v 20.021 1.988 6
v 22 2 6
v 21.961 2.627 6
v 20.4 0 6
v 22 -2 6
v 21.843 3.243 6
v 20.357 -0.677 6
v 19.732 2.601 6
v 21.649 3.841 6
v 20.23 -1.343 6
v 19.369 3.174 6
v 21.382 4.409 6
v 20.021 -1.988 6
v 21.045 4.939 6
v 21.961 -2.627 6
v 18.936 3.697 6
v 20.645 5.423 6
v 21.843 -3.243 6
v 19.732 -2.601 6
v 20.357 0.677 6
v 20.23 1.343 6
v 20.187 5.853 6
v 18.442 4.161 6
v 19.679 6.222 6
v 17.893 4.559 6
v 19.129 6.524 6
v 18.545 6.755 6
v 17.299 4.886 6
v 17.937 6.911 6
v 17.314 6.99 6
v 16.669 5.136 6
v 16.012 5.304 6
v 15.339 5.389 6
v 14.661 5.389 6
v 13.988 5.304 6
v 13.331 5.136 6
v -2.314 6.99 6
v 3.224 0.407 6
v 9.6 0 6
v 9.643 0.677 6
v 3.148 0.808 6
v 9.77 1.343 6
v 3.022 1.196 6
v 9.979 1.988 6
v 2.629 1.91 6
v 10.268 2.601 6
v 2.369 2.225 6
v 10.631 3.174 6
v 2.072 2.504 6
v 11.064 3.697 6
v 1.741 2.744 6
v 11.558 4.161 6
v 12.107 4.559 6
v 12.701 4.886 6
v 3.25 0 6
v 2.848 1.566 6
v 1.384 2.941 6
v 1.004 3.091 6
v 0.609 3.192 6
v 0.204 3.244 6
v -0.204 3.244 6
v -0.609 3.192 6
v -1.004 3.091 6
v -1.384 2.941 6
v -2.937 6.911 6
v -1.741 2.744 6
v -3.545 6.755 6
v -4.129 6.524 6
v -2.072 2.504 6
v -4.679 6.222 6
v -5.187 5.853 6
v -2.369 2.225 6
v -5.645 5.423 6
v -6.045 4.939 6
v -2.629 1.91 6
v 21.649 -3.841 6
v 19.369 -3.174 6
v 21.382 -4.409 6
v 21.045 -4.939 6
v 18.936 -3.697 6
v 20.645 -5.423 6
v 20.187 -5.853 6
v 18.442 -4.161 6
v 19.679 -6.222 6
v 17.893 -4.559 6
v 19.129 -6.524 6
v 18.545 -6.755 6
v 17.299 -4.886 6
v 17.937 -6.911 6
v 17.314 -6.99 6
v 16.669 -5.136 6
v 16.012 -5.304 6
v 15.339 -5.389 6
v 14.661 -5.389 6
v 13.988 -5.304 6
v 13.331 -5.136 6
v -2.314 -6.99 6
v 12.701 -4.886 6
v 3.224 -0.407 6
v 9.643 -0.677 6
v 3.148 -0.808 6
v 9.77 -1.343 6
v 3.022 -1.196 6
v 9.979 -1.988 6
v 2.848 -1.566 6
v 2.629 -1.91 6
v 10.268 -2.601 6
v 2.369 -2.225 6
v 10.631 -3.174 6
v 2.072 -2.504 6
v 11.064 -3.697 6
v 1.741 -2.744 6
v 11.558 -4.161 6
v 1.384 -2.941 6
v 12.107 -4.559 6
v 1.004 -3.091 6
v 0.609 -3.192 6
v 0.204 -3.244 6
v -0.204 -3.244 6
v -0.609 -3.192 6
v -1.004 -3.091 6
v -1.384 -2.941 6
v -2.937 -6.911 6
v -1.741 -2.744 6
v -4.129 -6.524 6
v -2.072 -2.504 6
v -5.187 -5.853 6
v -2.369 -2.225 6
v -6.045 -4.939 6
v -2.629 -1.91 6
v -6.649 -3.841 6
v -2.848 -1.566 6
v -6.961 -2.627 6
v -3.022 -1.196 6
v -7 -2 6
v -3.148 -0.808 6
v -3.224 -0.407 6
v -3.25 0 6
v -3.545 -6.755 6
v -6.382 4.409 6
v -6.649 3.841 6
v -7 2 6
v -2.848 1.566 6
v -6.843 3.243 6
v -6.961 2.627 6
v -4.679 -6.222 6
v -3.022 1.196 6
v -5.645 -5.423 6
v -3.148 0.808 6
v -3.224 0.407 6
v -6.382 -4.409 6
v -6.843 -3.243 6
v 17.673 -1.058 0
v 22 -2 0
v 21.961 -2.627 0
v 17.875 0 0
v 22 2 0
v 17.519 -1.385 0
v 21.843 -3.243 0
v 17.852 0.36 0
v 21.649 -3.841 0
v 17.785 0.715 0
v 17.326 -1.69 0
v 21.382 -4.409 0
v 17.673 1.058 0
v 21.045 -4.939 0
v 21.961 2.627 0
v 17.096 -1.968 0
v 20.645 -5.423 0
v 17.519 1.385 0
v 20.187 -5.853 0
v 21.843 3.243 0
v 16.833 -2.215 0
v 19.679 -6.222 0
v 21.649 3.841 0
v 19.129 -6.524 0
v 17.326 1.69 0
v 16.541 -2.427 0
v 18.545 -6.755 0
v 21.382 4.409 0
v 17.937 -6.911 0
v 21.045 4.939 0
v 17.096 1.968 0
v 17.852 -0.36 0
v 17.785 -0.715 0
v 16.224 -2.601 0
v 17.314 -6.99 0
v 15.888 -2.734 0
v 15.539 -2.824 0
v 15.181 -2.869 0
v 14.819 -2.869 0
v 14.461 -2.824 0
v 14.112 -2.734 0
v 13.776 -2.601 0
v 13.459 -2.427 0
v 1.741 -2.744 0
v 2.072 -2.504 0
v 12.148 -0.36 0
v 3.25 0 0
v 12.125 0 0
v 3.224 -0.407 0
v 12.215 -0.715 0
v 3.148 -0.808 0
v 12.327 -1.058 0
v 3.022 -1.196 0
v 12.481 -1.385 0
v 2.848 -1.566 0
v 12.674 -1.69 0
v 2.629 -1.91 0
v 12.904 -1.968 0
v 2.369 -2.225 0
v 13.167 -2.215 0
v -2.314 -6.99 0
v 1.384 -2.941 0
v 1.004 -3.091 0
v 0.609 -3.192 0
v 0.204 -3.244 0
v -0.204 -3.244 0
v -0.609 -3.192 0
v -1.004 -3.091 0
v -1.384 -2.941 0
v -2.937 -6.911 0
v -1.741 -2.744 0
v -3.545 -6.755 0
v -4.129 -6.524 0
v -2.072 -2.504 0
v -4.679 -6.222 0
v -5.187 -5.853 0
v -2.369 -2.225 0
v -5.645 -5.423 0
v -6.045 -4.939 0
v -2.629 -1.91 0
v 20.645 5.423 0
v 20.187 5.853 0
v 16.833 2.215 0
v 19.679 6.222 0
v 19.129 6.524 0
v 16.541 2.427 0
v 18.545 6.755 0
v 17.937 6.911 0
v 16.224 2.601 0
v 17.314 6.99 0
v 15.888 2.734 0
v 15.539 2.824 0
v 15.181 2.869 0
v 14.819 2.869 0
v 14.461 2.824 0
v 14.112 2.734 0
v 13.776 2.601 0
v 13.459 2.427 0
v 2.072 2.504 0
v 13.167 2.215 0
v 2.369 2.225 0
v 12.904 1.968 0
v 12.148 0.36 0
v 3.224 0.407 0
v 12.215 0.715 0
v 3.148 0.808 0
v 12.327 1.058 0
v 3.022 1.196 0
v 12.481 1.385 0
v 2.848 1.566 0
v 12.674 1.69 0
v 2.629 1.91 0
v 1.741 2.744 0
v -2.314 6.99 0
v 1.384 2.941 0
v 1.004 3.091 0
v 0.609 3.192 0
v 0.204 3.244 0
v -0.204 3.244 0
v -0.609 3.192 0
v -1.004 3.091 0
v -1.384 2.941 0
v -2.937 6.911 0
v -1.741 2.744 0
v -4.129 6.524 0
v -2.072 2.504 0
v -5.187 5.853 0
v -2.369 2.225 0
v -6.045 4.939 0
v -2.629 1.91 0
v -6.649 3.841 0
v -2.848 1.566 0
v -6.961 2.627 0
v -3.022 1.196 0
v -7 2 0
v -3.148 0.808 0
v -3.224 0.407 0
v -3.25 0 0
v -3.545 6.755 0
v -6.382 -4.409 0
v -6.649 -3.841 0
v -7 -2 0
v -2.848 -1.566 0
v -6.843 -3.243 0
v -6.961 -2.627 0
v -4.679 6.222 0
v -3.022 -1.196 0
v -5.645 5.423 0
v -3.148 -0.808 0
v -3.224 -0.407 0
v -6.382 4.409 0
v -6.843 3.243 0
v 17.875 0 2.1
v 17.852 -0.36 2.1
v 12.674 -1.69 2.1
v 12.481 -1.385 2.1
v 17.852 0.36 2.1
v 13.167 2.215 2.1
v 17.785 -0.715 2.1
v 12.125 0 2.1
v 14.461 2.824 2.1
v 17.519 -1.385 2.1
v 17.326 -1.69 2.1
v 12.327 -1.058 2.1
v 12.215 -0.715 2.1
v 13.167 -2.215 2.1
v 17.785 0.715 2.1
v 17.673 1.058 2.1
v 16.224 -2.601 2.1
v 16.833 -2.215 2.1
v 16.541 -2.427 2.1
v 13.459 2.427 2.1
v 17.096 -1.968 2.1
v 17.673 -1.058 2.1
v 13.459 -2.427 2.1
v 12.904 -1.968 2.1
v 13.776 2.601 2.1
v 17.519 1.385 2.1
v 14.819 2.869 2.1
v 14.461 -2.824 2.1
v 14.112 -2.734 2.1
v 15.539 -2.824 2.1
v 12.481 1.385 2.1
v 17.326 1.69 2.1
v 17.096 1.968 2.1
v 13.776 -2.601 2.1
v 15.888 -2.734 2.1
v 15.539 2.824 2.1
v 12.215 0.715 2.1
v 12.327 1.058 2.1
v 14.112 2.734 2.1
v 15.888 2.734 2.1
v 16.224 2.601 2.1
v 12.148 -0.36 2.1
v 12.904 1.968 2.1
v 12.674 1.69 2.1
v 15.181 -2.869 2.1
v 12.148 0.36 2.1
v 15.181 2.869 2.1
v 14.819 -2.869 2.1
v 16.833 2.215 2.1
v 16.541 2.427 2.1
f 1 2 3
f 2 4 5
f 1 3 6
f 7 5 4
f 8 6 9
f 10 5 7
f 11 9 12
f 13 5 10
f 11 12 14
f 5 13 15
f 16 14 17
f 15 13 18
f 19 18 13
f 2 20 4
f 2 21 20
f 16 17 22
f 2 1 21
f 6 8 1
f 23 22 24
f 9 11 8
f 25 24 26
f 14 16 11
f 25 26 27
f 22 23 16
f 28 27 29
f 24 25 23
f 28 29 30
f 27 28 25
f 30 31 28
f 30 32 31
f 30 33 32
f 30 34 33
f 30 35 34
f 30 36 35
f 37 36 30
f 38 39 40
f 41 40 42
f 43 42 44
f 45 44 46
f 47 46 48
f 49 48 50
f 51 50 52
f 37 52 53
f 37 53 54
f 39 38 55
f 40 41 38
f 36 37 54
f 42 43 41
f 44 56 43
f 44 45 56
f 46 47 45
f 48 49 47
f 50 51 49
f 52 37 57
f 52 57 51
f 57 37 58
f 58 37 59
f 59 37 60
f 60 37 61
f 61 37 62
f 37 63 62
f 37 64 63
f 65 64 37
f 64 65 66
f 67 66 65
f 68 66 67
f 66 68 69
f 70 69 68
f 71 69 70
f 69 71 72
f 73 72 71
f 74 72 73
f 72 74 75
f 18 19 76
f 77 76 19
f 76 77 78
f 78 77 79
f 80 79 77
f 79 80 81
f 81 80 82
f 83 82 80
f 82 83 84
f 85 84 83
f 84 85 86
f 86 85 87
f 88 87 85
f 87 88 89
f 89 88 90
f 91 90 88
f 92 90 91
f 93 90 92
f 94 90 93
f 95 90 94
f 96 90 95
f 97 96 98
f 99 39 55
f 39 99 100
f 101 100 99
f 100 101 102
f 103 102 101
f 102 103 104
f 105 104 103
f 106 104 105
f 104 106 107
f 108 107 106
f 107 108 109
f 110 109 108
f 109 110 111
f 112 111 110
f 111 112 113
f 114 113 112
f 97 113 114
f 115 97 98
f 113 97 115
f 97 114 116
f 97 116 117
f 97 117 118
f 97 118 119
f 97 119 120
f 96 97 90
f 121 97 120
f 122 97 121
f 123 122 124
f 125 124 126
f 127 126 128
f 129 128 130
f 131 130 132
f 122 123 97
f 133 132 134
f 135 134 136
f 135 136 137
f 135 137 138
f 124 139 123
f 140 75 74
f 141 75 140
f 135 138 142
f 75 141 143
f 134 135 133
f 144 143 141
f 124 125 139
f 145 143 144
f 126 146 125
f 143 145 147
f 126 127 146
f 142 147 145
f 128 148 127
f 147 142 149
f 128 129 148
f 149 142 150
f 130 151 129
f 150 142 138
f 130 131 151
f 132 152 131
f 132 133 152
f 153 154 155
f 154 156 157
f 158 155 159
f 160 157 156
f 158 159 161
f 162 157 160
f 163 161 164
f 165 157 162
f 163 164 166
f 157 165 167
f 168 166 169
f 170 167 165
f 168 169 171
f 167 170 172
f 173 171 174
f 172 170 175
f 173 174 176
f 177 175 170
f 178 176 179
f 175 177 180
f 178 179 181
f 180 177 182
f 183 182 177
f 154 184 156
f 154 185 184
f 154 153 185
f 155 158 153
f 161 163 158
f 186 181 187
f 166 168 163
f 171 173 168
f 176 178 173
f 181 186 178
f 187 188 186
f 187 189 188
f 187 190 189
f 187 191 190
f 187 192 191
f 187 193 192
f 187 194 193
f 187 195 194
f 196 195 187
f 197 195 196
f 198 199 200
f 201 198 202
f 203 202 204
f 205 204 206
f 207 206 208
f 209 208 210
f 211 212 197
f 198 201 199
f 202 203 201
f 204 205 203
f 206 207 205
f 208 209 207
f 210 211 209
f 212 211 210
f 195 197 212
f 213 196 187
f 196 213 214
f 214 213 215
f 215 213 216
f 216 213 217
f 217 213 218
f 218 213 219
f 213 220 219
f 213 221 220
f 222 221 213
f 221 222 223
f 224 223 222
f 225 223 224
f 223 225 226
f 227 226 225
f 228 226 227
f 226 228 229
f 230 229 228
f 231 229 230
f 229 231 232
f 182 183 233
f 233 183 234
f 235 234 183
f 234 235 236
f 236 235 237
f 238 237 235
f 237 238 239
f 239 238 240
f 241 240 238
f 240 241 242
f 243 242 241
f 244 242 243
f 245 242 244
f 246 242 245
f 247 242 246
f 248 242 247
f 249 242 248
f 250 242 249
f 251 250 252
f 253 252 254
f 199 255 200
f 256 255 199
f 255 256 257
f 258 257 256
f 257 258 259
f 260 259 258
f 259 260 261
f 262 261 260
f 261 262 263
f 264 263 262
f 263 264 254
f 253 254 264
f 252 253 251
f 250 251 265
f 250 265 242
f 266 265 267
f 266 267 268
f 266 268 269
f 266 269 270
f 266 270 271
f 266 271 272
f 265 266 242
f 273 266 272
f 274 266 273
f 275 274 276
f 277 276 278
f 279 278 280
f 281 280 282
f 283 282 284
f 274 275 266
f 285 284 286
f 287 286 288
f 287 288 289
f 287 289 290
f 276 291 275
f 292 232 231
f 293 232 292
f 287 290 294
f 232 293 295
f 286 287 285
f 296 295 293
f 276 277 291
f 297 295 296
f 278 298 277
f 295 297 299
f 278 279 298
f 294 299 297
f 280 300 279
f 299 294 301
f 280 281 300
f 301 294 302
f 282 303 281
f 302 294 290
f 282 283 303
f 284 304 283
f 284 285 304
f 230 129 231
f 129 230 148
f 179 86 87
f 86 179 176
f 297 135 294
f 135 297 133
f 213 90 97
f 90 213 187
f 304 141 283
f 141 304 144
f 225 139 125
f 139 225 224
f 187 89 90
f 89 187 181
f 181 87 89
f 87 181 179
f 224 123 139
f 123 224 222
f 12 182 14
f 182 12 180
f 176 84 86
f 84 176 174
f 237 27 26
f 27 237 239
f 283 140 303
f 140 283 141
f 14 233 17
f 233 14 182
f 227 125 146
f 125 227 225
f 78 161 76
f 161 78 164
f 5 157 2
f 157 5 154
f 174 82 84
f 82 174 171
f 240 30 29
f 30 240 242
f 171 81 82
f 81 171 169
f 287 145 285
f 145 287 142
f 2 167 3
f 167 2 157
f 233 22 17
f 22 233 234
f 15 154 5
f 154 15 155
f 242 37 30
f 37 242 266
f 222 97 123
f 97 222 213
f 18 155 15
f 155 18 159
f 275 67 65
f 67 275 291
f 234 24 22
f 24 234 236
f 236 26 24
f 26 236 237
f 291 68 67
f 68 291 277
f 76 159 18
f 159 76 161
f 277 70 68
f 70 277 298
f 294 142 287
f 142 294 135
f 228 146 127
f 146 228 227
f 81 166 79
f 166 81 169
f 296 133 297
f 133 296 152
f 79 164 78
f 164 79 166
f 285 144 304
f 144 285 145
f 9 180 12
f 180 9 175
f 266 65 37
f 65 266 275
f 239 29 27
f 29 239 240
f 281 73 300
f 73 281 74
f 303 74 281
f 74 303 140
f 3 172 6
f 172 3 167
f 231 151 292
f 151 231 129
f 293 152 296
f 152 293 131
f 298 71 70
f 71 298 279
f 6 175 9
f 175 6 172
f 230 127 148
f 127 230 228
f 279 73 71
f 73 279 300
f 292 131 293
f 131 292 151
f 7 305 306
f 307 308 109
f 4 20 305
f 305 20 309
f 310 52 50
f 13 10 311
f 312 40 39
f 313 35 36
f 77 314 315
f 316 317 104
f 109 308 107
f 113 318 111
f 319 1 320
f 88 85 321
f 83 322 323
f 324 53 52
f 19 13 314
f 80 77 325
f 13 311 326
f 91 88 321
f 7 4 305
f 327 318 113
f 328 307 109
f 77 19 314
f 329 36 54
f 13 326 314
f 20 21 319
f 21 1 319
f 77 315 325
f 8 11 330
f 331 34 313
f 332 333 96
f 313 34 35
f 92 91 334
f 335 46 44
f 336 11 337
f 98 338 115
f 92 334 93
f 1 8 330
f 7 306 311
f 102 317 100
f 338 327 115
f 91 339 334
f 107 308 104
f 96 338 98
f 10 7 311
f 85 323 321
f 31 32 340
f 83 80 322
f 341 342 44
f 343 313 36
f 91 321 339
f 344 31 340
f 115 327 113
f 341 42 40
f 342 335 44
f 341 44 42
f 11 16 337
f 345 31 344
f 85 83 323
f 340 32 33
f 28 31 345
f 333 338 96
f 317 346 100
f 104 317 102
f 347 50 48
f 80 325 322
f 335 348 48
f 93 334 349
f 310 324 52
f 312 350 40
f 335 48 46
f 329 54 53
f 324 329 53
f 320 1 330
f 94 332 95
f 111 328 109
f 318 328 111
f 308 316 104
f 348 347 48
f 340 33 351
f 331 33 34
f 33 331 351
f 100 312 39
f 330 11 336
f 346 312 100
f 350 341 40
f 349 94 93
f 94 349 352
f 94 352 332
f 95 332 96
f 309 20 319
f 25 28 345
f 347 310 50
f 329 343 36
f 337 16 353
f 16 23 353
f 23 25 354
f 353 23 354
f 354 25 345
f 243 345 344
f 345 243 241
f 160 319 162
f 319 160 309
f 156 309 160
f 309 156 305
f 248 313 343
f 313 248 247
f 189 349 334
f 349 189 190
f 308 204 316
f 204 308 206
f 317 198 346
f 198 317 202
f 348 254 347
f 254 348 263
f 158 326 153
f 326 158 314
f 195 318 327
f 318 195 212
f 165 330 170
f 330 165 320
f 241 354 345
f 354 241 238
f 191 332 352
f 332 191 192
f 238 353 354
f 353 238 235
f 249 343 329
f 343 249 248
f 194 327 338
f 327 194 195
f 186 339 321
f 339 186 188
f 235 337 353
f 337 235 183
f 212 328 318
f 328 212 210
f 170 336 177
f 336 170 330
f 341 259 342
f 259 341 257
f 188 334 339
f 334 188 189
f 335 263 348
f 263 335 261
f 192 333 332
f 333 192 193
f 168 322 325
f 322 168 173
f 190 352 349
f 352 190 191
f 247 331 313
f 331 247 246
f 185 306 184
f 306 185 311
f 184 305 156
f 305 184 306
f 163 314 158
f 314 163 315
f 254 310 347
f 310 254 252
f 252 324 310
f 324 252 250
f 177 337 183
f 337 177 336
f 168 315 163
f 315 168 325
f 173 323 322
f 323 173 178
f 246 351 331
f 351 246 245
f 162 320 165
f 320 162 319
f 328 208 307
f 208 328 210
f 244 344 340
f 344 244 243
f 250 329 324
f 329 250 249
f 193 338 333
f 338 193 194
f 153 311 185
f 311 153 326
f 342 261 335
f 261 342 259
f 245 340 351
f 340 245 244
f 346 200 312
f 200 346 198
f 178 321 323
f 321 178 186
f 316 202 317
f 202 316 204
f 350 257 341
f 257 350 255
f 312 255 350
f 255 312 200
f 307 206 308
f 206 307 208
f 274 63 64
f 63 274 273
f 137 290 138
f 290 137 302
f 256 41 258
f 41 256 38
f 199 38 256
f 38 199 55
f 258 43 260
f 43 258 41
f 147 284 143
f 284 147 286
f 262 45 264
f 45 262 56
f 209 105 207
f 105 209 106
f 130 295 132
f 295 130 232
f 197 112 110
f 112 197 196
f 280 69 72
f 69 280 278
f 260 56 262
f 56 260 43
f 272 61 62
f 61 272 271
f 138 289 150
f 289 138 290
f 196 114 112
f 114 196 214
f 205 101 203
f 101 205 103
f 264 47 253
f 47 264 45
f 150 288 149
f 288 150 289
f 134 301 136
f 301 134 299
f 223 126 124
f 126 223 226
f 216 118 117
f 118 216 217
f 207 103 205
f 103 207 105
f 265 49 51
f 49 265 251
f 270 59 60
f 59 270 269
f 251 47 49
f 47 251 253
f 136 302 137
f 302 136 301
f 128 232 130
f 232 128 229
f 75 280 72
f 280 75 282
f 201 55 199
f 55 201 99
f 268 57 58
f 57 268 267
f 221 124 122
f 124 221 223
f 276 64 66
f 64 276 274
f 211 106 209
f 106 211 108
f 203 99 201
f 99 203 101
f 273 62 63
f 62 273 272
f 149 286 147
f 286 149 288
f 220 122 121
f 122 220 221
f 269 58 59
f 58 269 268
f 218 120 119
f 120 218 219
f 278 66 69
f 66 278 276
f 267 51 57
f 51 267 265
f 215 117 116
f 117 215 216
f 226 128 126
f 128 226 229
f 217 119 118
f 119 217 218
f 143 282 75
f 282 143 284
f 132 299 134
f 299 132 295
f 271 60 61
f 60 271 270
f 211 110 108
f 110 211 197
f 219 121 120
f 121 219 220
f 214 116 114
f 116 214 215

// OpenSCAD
$fn = 50;


difference() {
	union() {
		cylinder(h = 6, r = 7.0000000000);
		translate(v = [7.5000000000, 0.0000000000, 0]) {
			hull() {
				translate(v = [-9.5000000000, 2.0000000000, 0]) {
					cylinder(h = 6, r = 5);
				}
				translate(v = [9.5000000000, 2.0000000000, 0]) {
					cylinder(h = 6, r = 5);
				}
				translate(v = [-9.5000000000, -2.0000000000, 0]) {
					cylinder(h = 6, r = 5);
				}
				translate(v = [9.5000000000, -2.0000000000, 0]) {
					cylinder(h = 6, r = 5);
				}
			}
		}
		translate(v = [7.5000000000, 0.0000000000, 0]) {
			hull() {
				translate(v = [-9.5000000000, 2.0000000000, 0]) {
					cylinder(h = 6, r = 5);
				}
				translate(v = [9.5000000000, 2.0000000000, 0]) {
					cylinder(h = 6, r = 5);
				}
				translate(v = [-9.5000000000, -2.0000000000, 0]) {
					cylinder(h = 6, r = 5);
				}
				translate(v = [9.5000000000, -2.0000000000, 0]) {
					cylinder(h = 6, r = 5);
				}
			}
		}
	}
	union() {
		translate(v = [15.0000000000, 0.0000000000, 6]) {
			rotate(a = [0, 0, 0]) {
				difference() {
					union() {
						#translate(v = [0, 0, -6.0000000000]) {
							cylinder(h = 6, r = 2.6000000000);
						}
						#translate(v = [0, 0, -3.9000000000]) {
							cylinder(h = 3.9000000000, r1 = 2.8750000000, r2 = 5.4000000000);
						}
						#translate(v = [0, 0, -6.0000000000]) {
							cylinder(h = 6, r = 2.8750000000);
						}
						#translate(v = [0, 0, -6.0000000000]) {
							cylinder(h = 6, r = 2.6000000000);
						}
					}
					union();
				}
			}
		}
		translate(v = [15.0000000000, 0.0000000000, 6]) {
			rotate(a = [0, 0, 0]) {
				difference() {
					union() {
						#translate(v = [0, 0, -6.0000000000]) {
							cylinder(h = 6, r = 2.6000000000);
						}
						#translate(v = [0, 0, -3.9000000000]) {
							cylinder(h = 3.9000000000, r1 = 2.8750000000, r2 = 5.4000000000);
						}
						#translate(v = [0, 0, -6.0000000000]) {
							cylinder(h = 6, r = 2.8750000000);
						}
						#translate(v = [0, 0, -6.0000000000]) {
							cylinder(h = 6, r = 2.6000000000);
						}
					}
					union();
				}
			}
		}
		translate(v = [0, 0, -100]) {
			cylinder(h = 200, r = 3.2500000000);
		}
		translate(v = [0, 0, -100]) {
			cylinder(h = 200, r = 1.8000000000);
		}
	}
}
